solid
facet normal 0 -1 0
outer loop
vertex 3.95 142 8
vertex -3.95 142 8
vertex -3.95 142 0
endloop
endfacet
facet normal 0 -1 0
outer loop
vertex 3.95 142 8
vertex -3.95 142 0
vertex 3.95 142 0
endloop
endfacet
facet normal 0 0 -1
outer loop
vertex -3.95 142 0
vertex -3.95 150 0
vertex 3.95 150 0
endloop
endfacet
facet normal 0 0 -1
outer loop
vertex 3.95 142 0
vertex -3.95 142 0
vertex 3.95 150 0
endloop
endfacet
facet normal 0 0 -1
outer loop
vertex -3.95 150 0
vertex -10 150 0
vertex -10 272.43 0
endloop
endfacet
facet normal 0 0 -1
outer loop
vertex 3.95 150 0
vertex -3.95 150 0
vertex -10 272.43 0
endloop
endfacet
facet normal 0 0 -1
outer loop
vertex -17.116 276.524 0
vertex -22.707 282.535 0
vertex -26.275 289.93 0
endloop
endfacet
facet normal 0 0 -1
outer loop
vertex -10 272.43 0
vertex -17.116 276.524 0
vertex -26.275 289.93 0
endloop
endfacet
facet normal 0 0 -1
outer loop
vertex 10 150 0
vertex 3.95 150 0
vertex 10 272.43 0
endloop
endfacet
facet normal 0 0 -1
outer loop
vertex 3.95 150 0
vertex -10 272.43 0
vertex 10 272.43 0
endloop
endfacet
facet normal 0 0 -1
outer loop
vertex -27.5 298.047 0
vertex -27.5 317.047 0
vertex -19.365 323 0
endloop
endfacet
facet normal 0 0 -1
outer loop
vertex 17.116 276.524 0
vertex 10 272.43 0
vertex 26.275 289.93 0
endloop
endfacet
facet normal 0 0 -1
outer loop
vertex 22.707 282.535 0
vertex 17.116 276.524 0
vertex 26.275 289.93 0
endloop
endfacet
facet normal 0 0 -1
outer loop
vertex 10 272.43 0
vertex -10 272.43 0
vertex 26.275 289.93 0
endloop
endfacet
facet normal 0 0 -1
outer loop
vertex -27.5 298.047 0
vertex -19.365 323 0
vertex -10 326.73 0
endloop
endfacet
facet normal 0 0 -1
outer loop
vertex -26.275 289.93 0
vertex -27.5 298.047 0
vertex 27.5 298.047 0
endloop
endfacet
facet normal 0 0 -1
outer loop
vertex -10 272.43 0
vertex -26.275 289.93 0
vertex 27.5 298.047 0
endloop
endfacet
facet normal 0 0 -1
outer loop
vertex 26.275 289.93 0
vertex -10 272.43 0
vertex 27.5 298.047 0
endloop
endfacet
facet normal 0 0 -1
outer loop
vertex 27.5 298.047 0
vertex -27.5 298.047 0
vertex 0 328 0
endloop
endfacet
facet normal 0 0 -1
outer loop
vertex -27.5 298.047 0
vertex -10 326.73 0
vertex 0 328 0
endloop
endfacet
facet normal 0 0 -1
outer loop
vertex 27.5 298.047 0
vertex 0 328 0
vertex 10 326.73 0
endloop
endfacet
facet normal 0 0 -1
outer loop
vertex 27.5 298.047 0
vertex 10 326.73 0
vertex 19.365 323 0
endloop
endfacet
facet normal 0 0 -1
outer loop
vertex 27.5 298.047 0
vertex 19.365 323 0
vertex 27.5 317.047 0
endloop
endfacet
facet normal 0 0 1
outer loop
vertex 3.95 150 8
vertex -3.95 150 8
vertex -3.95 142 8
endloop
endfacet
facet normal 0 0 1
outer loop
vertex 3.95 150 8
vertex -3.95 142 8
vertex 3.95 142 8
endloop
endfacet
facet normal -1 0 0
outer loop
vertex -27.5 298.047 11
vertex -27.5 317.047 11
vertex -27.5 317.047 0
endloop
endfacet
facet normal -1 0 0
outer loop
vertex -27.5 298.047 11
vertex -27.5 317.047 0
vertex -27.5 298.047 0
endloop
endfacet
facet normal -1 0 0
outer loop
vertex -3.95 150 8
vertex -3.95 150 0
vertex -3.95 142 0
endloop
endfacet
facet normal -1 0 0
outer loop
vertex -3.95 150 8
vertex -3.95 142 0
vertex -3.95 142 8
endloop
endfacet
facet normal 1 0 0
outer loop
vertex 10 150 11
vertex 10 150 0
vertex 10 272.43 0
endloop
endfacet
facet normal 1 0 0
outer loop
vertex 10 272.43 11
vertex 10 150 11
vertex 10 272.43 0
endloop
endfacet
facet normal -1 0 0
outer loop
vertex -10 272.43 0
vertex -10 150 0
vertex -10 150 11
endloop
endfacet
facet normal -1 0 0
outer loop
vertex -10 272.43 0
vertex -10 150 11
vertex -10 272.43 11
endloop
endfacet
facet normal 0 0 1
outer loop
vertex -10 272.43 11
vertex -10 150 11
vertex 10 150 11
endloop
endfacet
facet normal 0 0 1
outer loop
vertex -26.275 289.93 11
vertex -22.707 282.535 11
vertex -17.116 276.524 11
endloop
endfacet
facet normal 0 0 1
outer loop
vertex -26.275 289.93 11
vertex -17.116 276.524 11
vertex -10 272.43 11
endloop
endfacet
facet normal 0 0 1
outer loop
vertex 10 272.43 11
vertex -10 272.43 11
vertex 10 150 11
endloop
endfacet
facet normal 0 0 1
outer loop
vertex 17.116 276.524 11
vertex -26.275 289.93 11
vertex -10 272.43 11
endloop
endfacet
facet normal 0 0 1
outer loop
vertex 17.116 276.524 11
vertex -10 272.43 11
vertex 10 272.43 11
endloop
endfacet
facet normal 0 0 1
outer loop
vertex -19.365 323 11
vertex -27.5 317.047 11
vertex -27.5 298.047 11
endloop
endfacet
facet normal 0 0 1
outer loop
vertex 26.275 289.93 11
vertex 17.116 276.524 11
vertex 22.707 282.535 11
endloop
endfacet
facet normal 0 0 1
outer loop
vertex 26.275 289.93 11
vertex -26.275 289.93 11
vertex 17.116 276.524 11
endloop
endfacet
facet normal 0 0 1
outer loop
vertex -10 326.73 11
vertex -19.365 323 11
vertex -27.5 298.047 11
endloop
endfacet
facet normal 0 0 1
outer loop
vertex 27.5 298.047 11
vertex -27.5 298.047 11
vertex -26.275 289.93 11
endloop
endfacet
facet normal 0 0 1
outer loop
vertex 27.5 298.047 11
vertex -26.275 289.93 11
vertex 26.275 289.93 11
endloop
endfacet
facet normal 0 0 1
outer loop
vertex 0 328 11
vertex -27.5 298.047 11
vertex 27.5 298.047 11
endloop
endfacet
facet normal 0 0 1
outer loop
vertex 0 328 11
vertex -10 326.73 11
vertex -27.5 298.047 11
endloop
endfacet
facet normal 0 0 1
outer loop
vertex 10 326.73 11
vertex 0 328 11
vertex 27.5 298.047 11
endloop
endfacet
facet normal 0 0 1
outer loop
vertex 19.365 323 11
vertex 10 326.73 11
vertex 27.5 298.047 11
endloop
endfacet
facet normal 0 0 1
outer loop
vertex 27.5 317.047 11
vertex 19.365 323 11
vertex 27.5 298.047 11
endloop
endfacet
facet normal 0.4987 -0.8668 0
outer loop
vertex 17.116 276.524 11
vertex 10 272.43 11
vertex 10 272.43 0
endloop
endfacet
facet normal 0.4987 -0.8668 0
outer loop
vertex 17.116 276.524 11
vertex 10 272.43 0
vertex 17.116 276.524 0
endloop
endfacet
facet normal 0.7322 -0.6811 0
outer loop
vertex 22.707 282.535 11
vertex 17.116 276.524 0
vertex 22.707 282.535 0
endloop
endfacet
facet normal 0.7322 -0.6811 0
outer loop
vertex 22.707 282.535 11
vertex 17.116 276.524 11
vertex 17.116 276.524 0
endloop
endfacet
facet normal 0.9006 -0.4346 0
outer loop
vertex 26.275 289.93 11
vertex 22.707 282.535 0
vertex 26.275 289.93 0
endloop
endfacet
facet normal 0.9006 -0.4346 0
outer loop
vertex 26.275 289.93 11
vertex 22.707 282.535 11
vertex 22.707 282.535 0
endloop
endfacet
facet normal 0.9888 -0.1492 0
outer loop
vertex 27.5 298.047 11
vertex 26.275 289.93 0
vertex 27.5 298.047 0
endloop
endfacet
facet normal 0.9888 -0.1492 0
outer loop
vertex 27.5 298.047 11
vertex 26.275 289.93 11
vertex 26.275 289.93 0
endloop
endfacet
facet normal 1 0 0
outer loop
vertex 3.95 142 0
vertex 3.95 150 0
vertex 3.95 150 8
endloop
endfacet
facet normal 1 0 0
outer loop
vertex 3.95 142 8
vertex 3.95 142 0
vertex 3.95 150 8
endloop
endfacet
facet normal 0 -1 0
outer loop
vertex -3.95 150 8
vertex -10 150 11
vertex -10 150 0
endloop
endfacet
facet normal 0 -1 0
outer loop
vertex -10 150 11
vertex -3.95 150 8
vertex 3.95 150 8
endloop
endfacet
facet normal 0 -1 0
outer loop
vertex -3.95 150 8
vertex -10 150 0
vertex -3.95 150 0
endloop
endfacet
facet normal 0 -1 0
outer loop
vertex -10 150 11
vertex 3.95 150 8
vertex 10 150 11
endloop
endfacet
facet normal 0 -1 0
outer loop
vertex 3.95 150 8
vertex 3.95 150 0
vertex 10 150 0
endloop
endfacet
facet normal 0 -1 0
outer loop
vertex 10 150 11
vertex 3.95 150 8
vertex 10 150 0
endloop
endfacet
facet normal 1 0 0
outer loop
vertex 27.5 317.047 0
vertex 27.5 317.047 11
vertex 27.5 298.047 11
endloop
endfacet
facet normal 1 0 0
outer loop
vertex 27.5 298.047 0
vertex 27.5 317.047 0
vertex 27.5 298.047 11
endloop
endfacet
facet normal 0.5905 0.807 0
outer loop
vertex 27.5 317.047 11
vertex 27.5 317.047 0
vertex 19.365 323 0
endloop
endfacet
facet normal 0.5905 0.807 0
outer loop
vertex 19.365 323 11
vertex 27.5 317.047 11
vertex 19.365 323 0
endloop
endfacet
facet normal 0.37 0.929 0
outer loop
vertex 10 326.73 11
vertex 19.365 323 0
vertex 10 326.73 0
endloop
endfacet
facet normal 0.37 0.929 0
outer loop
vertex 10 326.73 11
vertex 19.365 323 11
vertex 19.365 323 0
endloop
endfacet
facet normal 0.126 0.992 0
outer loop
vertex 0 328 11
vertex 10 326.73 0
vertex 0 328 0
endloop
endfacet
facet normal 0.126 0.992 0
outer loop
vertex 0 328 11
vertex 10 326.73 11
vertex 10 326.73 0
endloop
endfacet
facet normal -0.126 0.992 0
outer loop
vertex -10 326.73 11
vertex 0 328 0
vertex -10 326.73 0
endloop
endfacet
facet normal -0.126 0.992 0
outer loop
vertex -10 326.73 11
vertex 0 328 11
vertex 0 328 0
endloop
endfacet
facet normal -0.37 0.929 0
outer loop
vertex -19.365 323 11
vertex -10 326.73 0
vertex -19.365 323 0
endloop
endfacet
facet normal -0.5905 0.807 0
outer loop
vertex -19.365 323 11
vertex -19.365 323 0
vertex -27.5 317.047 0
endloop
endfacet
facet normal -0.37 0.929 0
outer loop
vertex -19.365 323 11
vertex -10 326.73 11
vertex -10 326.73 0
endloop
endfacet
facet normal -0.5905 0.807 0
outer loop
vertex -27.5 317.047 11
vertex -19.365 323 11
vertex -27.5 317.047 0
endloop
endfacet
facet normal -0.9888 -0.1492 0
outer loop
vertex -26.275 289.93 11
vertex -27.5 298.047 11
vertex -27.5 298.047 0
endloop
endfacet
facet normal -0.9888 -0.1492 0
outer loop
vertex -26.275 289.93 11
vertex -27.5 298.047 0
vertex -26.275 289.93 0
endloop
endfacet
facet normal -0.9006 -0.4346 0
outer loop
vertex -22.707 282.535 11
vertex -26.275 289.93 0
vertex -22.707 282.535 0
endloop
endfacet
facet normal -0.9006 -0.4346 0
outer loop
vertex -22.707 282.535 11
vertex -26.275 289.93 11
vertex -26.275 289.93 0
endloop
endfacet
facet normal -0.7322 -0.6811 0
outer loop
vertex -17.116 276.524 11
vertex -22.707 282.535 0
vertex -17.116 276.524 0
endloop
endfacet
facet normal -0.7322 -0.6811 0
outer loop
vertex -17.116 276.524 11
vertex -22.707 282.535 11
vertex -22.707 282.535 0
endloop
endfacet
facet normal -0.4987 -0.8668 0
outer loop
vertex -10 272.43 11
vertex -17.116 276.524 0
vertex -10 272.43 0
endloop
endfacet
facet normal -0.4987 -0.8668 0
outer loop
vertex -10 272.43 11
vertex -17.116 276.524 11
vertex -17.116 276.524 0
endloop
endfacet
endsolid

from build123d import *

# Parameters (mm, degrees)
SKETCH_W     = 20
SKETCH_H     = 128
PAD_DEPTH    = 11
PAD001_DEPTH = 11
SKETCH002_W  = 7.9
SKETCH002_H  = 8
PAD002_DEPTH = 8


with BuildPart() as part:
    # Sketch → Pad (new body)
    with BuildSketch(Plane.XY):
        with Locations((0, 214)):
            Rectangle(SKETCH_W, SKETCH_H)
    extrude(amount=PAD_DEPTH)

    # Sketch001 (on Face6 of Pad) → Pad001 (join)
    with BuildSketch(Plane.XY.offset(11)):
        with BuildLine():
            ThreePointArc((27.5, 317.047375), (0, 328), (-27.5, 317.047375))
            Line((-27.5, 317.047375), (-27.5, 298.047375))
            ThreePointArc((-27.5, 298.047375), (0, 270.547415), (27.5, 298.047375))
            Line((27.5, 317.047375), (27.5, 298.047375))
        make_face()
    extrude(amount=-PAD001_DEPTH)

    # Sketch002 (on Face5 of Pad001) → Pad002 (join)
    with BuildSketch(Plane.XZ.offset(-150)):
        with Locations((0, 4)):
            Rectangle(SKETCH002_W, SKETCH002_H)
    extrude(amount=PAD002_DEPTH)


solid = part.part
